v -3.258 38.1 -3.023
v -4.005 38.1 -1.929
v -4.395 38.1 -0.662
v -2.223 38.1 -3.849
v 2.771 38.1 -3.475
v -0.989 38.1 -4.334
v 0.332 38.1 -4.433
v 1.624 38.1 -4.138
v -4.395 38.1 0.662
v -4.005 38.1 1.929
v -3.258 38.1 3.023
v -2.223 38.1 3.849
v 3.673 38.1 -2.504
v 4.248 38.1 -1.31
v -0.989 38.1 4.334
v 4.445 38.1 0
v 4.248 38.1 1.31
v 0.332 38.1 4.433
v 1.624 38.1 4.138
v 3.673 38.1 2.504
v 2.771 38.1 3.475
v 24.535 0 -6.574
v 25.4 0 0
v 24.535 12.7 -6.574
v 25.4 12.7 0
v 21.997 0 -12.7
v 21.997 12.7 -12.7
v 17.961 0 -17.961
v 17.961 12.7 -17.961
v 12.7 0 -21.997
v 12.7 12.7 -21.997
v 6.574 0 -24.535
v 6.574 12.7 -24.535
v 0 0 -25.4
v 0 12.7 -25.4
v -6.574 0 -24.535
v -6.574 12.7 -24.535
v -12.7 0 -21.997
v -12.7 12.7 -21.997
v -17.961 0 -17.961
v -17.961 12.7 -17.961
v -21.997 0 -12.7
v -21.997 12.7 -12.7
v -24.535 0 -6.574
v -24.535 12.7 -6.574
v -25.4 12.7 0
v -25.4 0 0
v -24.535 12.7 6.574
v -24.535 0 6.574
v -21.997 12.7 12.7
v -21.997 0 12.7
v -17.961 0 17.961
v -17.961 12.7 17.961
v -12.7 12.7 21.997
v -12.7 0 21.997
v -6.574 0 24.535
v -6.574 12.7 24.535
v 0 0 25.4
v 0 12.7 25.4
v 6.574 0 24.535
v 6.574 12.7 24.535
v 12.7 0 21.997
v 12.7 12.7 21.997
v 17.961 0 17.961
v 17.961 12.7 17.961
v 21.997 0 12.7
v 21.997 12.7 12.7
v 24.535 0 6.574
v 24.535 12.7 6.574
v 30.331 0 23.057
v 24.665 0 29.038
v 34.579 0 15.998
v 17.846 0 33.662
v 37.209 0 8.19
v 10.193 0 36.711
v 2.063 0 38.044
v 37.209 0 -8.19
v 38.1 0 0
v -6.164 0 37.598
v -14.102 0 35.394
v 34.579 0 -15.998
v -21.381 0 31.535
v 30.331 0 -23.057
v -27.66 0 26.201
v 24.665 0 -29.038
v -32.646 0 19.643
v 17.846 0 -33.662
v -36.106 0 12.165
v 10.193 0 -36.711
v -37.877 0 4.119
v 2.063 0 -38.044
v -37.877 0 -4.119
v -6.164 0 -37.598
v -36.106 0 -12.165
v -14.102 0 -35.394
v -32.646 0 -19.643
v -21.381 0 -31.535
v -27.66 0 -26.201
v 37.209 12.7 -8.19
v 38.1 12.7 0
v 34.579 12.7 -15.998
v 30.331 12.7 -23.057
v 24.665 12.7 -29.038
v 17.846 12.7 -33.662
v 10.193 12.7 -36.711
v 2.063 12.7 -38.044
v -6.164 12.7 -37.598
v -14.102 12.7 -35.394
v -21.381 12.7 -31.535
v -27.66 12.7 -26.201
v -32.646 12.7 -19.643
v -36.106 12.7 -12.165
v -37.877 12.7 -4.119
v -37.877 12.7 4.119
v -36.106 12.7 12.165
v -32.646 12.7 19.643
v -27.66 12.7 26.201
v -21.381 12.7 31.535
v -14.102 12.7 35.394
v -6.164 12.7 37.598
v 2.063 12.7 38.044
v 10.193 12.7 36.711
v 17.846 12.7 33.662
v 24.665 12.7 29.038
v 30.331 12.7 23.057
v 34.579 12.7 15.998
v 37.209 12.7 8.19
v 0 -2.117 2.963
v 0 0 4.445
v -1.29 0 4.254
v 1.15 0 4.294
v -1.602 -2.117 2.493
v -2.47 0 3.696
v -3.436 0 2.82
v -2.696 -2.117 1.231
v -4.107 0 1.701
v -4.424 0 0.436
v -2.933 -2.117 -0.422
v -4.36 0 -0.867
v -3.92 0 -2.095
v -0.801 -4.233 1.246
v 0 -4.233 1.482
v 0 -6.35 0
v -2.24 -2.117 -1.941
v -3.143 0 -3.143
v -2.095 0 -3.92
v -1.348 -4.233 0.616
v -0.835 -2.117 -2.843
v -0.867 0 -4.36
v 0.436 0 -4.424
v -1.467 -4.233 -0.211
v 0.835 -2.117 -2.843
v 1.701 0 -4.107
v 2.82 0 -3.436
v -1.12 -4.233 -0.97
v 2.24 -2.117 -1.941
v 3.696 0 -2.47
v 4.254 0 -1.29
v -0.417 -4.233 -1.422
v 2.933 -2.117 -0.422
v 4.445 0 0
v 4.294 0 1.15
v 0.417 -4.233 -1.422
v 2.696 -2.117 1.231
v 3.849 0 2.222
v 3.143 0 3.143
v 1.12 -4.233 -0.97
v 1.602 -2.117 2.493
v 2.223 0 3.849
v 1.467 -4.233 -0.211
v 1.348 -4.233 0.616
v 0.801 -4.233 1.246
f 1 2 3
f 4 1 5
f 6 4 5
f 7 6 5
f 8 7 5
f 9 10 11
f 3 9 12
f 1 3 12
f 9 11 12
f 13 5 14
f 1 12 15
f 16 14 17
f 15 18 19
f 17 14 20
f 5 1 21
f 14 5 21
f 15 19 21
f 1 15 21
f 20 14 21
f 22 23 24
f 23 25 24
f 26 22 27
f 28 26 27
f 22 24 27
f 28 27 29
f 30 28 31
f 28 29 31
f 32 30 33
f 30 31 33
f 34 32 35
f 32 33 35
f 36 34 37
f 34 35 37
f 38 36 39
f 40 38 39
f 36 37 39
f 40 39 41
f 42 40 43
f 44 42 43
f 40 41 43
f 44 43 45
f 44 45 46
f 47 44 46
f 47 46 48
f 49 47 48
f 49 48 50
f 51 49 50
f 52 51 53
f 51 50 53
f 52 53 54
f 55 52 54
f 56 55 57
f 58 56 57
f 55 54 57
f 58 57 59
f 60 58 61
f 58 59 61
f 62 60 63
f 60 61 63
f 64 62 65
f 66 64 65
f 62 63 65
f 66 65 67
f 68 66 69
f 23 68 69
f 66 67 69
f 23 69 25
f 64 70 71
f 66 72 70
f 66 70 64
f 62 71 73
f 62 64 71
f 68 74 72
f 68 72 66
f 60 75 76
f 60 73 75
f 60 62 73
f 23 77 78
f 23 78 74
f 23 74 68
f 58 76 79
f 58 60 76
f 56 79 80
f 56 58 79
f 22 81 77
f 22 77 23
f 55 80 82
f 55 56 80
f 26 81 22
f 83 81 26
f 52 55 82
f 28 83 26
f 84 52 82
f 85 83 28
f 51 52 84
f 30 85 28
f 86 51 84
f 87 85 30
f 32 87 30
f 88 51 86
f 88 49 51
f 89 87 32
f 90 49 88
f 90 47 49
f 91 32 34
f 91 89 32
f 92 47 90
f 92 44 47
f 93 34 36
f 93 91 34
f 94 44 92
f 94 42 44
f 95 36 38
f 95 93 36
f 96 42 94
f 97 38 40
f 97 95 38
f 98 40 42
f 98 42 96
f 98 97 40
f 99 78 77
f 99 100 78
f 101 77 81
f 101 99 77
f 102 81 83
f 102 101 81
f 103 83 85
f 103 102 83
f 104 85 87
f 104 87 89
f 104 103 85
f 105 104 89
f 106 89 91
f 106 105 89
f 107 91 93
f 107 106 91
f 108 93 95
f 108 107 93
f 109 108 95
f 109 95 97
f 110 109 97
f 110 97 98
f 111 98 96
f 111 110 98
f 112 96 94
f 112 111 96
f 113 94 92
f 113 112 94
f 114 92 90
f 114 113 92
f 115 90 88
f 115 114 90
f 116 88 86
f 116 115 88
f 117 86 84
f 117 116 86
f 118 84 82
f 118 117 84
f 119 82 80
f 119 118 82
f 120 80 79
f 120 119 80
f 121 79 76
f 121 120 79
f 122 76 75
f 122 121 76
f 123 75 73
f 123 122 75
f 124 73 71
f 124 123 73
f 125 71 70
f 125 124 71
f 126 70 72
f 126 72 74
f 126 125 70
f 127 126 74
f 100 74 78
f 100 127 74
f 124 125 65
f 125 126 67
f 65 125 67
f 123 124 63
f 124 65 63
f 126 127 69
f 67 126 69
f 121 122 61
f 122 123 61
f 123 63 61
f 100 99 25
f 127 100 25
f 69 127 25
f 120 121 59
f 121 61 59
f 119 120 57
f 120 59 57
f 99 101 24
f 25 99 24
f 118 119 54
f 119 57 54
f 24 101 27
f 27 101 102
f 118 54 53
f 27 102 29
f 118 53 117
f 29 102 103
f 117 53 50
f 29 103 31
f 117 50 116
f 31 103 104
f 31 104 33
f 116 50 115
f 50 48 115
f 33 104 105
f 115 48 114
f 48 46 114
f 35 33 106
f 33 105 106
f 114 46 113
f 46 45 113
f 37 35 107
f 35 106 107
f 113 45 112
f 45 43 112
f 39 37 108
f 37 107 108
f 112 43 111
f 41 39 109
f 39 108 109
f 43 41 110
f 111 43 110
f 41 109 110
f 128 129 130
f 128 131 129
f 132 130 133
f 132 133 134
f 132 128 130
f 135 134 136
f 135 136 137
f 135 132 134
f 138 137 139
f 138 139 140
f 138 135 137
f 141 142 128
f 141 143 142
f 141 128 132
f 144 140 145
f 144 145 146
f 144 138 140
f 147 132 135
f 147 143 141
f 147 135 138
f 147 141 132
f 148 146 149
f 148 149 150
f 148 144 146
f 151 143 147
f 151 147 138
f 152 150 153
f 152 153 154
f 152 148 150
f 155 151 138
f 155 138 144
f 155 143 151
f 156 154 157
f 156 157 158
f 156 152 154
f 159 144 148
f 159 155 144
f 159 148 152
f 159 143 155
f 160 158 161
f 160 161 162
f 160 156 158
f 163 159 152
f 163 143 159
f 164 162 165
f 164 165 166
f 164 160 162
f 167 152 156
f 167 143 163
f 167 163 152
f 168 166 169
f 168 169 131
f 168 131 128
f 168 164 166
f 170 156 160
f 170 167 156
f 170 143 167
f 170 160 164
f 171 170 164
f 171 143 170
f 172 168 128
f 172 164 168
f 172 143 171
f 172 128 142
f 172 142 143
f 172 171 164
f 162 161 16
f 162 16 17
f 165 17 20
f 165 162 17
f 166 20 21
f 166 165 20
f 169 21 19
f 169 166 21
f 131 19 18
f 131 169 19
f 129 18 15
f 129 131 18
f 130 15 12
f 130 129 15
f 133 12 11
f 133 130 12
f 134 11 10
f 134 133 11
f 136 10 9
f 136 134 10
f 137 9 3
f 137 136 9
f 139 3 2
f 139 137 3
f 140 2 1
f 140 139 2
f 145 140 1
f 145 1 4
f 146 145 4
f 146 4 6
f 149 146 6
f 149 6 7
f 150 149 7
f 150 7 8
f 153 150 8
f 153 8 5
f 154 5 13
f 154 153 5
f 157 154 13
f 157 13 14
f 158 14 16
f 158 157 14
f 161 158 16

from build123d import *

# Parameters (mm, degrees)
F0_W     = 12.7
F0_H     = 12.7
F2_R     = 4.445
F3_DEPTH = 38.1


with BuildPart() as f1:
    # F0 (on Top) → F1 (revolve)
    with BuildSketch(Plane.XY):
        with Locations((31.75, 6.35)):
            Rectangle(F0_W, F0_H)
    revolve(axis=Axis((0, 27.467201, 0), (0, 1, 0)))


with BuildPart() as f3:
    # F2 (on Front) → F3 (new body)
    with BuildSketch(Plane.XZ):
        Circle(F2_R)
    extrude(amount=-F3_DEPTH)

    # F4 (on Right) → F5 (revolve)
    with BuildSketch(Plane.YZ):
        Polygon((-6.35, 0), (0, 0), (0, 4.445), align=None)
    revolve(axis=Axis((0, -21.669375, 0), (0, -1, 0)))


solid = Compound([f1.part, f3.part])
